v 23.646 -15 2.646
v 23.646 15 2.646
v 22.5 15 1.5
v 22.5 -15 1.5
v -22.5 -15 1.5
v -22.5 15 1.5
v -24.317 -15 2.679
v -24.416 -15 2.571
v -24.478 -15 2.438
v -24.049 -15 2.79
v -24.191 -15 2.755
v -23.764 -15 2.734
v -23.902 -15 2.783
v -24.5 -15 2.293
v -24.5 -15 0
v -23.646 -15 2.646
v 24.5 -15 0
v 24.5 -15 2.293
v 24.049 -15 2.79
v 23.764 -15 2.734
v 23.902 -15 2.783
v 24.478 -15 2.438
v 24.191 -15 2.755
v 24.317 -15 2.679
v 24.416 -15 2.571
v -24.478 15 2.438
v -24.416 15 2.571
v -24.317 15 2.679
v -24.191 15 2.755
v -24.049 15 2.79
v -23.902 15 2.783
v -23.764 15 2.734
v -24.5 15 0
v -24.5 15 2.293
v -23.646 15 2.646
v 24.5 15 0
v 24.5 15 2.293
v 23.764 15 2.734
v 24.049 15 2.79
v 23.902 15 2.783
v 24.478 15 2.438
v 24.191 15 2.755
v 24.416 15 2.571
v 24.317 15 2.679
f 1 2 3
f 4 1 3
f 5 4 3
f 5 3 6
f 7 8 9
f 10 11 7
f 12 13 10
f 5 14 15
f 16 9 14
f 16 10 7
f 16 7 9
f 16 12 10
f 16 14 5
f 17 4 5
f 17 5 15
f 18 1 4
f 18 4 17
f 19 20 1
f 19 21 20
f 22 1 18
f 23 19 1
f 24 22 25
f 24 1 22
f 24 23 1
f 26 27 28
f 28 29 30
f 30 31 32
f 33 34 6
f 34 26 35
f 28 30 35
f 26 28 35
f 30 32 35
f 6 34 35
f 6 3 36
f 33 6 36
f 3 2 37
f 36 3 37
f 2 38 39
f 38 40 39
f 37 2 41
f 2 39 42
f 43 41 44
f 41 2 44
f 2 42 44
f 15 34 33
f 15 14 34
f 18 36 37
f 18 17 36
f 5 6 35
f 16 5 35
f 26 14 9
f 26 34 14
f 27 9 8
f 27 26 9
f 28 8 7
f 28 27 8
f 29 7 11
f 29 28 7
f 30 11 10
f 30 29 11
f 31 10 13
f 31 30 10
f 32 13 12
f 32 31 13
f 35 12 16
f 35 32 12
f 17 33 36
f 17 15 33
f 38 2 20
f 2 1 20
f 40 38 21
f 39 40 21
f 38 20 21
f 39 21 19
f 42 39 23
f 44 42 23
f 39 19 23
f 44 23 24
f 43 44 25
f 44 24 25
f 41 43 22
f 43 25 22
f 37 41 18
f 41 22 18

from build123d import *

# Parameters (mm, degrees)
F1_DEPTH = 15
F2_R     = 0.5


with BuildPart() as f1:
    # F0 (on Front) → F1 (new body, symmetric)
    with BuildSketch(Plane.XZ):
        Polygon((-24.5, 1.5), (-24.5, 0), (24.5, 0), (24.5, 1.5), (22.5, 1.5), (-22.5, 1.5), align=None)
        Polygon((-24.5, 3.5), (-24.5, 1.5), (-22.5, 1.5), align=None)
        Polygon((22.5, 1.5), (24.5, 1.5), (24.5, 3.5), align=None)
    extrude(amount=F1_DEPTH, both=True)

    # F2
    f2_edges = [f1.edges().sort_by_distance(p)[0] for p in [
        (-24.5, 0, 3.5),
        (24.5, 0, 3.5),
    ]]
    fillet(f2_edges, radius=F2_R)


solid = f1.part
